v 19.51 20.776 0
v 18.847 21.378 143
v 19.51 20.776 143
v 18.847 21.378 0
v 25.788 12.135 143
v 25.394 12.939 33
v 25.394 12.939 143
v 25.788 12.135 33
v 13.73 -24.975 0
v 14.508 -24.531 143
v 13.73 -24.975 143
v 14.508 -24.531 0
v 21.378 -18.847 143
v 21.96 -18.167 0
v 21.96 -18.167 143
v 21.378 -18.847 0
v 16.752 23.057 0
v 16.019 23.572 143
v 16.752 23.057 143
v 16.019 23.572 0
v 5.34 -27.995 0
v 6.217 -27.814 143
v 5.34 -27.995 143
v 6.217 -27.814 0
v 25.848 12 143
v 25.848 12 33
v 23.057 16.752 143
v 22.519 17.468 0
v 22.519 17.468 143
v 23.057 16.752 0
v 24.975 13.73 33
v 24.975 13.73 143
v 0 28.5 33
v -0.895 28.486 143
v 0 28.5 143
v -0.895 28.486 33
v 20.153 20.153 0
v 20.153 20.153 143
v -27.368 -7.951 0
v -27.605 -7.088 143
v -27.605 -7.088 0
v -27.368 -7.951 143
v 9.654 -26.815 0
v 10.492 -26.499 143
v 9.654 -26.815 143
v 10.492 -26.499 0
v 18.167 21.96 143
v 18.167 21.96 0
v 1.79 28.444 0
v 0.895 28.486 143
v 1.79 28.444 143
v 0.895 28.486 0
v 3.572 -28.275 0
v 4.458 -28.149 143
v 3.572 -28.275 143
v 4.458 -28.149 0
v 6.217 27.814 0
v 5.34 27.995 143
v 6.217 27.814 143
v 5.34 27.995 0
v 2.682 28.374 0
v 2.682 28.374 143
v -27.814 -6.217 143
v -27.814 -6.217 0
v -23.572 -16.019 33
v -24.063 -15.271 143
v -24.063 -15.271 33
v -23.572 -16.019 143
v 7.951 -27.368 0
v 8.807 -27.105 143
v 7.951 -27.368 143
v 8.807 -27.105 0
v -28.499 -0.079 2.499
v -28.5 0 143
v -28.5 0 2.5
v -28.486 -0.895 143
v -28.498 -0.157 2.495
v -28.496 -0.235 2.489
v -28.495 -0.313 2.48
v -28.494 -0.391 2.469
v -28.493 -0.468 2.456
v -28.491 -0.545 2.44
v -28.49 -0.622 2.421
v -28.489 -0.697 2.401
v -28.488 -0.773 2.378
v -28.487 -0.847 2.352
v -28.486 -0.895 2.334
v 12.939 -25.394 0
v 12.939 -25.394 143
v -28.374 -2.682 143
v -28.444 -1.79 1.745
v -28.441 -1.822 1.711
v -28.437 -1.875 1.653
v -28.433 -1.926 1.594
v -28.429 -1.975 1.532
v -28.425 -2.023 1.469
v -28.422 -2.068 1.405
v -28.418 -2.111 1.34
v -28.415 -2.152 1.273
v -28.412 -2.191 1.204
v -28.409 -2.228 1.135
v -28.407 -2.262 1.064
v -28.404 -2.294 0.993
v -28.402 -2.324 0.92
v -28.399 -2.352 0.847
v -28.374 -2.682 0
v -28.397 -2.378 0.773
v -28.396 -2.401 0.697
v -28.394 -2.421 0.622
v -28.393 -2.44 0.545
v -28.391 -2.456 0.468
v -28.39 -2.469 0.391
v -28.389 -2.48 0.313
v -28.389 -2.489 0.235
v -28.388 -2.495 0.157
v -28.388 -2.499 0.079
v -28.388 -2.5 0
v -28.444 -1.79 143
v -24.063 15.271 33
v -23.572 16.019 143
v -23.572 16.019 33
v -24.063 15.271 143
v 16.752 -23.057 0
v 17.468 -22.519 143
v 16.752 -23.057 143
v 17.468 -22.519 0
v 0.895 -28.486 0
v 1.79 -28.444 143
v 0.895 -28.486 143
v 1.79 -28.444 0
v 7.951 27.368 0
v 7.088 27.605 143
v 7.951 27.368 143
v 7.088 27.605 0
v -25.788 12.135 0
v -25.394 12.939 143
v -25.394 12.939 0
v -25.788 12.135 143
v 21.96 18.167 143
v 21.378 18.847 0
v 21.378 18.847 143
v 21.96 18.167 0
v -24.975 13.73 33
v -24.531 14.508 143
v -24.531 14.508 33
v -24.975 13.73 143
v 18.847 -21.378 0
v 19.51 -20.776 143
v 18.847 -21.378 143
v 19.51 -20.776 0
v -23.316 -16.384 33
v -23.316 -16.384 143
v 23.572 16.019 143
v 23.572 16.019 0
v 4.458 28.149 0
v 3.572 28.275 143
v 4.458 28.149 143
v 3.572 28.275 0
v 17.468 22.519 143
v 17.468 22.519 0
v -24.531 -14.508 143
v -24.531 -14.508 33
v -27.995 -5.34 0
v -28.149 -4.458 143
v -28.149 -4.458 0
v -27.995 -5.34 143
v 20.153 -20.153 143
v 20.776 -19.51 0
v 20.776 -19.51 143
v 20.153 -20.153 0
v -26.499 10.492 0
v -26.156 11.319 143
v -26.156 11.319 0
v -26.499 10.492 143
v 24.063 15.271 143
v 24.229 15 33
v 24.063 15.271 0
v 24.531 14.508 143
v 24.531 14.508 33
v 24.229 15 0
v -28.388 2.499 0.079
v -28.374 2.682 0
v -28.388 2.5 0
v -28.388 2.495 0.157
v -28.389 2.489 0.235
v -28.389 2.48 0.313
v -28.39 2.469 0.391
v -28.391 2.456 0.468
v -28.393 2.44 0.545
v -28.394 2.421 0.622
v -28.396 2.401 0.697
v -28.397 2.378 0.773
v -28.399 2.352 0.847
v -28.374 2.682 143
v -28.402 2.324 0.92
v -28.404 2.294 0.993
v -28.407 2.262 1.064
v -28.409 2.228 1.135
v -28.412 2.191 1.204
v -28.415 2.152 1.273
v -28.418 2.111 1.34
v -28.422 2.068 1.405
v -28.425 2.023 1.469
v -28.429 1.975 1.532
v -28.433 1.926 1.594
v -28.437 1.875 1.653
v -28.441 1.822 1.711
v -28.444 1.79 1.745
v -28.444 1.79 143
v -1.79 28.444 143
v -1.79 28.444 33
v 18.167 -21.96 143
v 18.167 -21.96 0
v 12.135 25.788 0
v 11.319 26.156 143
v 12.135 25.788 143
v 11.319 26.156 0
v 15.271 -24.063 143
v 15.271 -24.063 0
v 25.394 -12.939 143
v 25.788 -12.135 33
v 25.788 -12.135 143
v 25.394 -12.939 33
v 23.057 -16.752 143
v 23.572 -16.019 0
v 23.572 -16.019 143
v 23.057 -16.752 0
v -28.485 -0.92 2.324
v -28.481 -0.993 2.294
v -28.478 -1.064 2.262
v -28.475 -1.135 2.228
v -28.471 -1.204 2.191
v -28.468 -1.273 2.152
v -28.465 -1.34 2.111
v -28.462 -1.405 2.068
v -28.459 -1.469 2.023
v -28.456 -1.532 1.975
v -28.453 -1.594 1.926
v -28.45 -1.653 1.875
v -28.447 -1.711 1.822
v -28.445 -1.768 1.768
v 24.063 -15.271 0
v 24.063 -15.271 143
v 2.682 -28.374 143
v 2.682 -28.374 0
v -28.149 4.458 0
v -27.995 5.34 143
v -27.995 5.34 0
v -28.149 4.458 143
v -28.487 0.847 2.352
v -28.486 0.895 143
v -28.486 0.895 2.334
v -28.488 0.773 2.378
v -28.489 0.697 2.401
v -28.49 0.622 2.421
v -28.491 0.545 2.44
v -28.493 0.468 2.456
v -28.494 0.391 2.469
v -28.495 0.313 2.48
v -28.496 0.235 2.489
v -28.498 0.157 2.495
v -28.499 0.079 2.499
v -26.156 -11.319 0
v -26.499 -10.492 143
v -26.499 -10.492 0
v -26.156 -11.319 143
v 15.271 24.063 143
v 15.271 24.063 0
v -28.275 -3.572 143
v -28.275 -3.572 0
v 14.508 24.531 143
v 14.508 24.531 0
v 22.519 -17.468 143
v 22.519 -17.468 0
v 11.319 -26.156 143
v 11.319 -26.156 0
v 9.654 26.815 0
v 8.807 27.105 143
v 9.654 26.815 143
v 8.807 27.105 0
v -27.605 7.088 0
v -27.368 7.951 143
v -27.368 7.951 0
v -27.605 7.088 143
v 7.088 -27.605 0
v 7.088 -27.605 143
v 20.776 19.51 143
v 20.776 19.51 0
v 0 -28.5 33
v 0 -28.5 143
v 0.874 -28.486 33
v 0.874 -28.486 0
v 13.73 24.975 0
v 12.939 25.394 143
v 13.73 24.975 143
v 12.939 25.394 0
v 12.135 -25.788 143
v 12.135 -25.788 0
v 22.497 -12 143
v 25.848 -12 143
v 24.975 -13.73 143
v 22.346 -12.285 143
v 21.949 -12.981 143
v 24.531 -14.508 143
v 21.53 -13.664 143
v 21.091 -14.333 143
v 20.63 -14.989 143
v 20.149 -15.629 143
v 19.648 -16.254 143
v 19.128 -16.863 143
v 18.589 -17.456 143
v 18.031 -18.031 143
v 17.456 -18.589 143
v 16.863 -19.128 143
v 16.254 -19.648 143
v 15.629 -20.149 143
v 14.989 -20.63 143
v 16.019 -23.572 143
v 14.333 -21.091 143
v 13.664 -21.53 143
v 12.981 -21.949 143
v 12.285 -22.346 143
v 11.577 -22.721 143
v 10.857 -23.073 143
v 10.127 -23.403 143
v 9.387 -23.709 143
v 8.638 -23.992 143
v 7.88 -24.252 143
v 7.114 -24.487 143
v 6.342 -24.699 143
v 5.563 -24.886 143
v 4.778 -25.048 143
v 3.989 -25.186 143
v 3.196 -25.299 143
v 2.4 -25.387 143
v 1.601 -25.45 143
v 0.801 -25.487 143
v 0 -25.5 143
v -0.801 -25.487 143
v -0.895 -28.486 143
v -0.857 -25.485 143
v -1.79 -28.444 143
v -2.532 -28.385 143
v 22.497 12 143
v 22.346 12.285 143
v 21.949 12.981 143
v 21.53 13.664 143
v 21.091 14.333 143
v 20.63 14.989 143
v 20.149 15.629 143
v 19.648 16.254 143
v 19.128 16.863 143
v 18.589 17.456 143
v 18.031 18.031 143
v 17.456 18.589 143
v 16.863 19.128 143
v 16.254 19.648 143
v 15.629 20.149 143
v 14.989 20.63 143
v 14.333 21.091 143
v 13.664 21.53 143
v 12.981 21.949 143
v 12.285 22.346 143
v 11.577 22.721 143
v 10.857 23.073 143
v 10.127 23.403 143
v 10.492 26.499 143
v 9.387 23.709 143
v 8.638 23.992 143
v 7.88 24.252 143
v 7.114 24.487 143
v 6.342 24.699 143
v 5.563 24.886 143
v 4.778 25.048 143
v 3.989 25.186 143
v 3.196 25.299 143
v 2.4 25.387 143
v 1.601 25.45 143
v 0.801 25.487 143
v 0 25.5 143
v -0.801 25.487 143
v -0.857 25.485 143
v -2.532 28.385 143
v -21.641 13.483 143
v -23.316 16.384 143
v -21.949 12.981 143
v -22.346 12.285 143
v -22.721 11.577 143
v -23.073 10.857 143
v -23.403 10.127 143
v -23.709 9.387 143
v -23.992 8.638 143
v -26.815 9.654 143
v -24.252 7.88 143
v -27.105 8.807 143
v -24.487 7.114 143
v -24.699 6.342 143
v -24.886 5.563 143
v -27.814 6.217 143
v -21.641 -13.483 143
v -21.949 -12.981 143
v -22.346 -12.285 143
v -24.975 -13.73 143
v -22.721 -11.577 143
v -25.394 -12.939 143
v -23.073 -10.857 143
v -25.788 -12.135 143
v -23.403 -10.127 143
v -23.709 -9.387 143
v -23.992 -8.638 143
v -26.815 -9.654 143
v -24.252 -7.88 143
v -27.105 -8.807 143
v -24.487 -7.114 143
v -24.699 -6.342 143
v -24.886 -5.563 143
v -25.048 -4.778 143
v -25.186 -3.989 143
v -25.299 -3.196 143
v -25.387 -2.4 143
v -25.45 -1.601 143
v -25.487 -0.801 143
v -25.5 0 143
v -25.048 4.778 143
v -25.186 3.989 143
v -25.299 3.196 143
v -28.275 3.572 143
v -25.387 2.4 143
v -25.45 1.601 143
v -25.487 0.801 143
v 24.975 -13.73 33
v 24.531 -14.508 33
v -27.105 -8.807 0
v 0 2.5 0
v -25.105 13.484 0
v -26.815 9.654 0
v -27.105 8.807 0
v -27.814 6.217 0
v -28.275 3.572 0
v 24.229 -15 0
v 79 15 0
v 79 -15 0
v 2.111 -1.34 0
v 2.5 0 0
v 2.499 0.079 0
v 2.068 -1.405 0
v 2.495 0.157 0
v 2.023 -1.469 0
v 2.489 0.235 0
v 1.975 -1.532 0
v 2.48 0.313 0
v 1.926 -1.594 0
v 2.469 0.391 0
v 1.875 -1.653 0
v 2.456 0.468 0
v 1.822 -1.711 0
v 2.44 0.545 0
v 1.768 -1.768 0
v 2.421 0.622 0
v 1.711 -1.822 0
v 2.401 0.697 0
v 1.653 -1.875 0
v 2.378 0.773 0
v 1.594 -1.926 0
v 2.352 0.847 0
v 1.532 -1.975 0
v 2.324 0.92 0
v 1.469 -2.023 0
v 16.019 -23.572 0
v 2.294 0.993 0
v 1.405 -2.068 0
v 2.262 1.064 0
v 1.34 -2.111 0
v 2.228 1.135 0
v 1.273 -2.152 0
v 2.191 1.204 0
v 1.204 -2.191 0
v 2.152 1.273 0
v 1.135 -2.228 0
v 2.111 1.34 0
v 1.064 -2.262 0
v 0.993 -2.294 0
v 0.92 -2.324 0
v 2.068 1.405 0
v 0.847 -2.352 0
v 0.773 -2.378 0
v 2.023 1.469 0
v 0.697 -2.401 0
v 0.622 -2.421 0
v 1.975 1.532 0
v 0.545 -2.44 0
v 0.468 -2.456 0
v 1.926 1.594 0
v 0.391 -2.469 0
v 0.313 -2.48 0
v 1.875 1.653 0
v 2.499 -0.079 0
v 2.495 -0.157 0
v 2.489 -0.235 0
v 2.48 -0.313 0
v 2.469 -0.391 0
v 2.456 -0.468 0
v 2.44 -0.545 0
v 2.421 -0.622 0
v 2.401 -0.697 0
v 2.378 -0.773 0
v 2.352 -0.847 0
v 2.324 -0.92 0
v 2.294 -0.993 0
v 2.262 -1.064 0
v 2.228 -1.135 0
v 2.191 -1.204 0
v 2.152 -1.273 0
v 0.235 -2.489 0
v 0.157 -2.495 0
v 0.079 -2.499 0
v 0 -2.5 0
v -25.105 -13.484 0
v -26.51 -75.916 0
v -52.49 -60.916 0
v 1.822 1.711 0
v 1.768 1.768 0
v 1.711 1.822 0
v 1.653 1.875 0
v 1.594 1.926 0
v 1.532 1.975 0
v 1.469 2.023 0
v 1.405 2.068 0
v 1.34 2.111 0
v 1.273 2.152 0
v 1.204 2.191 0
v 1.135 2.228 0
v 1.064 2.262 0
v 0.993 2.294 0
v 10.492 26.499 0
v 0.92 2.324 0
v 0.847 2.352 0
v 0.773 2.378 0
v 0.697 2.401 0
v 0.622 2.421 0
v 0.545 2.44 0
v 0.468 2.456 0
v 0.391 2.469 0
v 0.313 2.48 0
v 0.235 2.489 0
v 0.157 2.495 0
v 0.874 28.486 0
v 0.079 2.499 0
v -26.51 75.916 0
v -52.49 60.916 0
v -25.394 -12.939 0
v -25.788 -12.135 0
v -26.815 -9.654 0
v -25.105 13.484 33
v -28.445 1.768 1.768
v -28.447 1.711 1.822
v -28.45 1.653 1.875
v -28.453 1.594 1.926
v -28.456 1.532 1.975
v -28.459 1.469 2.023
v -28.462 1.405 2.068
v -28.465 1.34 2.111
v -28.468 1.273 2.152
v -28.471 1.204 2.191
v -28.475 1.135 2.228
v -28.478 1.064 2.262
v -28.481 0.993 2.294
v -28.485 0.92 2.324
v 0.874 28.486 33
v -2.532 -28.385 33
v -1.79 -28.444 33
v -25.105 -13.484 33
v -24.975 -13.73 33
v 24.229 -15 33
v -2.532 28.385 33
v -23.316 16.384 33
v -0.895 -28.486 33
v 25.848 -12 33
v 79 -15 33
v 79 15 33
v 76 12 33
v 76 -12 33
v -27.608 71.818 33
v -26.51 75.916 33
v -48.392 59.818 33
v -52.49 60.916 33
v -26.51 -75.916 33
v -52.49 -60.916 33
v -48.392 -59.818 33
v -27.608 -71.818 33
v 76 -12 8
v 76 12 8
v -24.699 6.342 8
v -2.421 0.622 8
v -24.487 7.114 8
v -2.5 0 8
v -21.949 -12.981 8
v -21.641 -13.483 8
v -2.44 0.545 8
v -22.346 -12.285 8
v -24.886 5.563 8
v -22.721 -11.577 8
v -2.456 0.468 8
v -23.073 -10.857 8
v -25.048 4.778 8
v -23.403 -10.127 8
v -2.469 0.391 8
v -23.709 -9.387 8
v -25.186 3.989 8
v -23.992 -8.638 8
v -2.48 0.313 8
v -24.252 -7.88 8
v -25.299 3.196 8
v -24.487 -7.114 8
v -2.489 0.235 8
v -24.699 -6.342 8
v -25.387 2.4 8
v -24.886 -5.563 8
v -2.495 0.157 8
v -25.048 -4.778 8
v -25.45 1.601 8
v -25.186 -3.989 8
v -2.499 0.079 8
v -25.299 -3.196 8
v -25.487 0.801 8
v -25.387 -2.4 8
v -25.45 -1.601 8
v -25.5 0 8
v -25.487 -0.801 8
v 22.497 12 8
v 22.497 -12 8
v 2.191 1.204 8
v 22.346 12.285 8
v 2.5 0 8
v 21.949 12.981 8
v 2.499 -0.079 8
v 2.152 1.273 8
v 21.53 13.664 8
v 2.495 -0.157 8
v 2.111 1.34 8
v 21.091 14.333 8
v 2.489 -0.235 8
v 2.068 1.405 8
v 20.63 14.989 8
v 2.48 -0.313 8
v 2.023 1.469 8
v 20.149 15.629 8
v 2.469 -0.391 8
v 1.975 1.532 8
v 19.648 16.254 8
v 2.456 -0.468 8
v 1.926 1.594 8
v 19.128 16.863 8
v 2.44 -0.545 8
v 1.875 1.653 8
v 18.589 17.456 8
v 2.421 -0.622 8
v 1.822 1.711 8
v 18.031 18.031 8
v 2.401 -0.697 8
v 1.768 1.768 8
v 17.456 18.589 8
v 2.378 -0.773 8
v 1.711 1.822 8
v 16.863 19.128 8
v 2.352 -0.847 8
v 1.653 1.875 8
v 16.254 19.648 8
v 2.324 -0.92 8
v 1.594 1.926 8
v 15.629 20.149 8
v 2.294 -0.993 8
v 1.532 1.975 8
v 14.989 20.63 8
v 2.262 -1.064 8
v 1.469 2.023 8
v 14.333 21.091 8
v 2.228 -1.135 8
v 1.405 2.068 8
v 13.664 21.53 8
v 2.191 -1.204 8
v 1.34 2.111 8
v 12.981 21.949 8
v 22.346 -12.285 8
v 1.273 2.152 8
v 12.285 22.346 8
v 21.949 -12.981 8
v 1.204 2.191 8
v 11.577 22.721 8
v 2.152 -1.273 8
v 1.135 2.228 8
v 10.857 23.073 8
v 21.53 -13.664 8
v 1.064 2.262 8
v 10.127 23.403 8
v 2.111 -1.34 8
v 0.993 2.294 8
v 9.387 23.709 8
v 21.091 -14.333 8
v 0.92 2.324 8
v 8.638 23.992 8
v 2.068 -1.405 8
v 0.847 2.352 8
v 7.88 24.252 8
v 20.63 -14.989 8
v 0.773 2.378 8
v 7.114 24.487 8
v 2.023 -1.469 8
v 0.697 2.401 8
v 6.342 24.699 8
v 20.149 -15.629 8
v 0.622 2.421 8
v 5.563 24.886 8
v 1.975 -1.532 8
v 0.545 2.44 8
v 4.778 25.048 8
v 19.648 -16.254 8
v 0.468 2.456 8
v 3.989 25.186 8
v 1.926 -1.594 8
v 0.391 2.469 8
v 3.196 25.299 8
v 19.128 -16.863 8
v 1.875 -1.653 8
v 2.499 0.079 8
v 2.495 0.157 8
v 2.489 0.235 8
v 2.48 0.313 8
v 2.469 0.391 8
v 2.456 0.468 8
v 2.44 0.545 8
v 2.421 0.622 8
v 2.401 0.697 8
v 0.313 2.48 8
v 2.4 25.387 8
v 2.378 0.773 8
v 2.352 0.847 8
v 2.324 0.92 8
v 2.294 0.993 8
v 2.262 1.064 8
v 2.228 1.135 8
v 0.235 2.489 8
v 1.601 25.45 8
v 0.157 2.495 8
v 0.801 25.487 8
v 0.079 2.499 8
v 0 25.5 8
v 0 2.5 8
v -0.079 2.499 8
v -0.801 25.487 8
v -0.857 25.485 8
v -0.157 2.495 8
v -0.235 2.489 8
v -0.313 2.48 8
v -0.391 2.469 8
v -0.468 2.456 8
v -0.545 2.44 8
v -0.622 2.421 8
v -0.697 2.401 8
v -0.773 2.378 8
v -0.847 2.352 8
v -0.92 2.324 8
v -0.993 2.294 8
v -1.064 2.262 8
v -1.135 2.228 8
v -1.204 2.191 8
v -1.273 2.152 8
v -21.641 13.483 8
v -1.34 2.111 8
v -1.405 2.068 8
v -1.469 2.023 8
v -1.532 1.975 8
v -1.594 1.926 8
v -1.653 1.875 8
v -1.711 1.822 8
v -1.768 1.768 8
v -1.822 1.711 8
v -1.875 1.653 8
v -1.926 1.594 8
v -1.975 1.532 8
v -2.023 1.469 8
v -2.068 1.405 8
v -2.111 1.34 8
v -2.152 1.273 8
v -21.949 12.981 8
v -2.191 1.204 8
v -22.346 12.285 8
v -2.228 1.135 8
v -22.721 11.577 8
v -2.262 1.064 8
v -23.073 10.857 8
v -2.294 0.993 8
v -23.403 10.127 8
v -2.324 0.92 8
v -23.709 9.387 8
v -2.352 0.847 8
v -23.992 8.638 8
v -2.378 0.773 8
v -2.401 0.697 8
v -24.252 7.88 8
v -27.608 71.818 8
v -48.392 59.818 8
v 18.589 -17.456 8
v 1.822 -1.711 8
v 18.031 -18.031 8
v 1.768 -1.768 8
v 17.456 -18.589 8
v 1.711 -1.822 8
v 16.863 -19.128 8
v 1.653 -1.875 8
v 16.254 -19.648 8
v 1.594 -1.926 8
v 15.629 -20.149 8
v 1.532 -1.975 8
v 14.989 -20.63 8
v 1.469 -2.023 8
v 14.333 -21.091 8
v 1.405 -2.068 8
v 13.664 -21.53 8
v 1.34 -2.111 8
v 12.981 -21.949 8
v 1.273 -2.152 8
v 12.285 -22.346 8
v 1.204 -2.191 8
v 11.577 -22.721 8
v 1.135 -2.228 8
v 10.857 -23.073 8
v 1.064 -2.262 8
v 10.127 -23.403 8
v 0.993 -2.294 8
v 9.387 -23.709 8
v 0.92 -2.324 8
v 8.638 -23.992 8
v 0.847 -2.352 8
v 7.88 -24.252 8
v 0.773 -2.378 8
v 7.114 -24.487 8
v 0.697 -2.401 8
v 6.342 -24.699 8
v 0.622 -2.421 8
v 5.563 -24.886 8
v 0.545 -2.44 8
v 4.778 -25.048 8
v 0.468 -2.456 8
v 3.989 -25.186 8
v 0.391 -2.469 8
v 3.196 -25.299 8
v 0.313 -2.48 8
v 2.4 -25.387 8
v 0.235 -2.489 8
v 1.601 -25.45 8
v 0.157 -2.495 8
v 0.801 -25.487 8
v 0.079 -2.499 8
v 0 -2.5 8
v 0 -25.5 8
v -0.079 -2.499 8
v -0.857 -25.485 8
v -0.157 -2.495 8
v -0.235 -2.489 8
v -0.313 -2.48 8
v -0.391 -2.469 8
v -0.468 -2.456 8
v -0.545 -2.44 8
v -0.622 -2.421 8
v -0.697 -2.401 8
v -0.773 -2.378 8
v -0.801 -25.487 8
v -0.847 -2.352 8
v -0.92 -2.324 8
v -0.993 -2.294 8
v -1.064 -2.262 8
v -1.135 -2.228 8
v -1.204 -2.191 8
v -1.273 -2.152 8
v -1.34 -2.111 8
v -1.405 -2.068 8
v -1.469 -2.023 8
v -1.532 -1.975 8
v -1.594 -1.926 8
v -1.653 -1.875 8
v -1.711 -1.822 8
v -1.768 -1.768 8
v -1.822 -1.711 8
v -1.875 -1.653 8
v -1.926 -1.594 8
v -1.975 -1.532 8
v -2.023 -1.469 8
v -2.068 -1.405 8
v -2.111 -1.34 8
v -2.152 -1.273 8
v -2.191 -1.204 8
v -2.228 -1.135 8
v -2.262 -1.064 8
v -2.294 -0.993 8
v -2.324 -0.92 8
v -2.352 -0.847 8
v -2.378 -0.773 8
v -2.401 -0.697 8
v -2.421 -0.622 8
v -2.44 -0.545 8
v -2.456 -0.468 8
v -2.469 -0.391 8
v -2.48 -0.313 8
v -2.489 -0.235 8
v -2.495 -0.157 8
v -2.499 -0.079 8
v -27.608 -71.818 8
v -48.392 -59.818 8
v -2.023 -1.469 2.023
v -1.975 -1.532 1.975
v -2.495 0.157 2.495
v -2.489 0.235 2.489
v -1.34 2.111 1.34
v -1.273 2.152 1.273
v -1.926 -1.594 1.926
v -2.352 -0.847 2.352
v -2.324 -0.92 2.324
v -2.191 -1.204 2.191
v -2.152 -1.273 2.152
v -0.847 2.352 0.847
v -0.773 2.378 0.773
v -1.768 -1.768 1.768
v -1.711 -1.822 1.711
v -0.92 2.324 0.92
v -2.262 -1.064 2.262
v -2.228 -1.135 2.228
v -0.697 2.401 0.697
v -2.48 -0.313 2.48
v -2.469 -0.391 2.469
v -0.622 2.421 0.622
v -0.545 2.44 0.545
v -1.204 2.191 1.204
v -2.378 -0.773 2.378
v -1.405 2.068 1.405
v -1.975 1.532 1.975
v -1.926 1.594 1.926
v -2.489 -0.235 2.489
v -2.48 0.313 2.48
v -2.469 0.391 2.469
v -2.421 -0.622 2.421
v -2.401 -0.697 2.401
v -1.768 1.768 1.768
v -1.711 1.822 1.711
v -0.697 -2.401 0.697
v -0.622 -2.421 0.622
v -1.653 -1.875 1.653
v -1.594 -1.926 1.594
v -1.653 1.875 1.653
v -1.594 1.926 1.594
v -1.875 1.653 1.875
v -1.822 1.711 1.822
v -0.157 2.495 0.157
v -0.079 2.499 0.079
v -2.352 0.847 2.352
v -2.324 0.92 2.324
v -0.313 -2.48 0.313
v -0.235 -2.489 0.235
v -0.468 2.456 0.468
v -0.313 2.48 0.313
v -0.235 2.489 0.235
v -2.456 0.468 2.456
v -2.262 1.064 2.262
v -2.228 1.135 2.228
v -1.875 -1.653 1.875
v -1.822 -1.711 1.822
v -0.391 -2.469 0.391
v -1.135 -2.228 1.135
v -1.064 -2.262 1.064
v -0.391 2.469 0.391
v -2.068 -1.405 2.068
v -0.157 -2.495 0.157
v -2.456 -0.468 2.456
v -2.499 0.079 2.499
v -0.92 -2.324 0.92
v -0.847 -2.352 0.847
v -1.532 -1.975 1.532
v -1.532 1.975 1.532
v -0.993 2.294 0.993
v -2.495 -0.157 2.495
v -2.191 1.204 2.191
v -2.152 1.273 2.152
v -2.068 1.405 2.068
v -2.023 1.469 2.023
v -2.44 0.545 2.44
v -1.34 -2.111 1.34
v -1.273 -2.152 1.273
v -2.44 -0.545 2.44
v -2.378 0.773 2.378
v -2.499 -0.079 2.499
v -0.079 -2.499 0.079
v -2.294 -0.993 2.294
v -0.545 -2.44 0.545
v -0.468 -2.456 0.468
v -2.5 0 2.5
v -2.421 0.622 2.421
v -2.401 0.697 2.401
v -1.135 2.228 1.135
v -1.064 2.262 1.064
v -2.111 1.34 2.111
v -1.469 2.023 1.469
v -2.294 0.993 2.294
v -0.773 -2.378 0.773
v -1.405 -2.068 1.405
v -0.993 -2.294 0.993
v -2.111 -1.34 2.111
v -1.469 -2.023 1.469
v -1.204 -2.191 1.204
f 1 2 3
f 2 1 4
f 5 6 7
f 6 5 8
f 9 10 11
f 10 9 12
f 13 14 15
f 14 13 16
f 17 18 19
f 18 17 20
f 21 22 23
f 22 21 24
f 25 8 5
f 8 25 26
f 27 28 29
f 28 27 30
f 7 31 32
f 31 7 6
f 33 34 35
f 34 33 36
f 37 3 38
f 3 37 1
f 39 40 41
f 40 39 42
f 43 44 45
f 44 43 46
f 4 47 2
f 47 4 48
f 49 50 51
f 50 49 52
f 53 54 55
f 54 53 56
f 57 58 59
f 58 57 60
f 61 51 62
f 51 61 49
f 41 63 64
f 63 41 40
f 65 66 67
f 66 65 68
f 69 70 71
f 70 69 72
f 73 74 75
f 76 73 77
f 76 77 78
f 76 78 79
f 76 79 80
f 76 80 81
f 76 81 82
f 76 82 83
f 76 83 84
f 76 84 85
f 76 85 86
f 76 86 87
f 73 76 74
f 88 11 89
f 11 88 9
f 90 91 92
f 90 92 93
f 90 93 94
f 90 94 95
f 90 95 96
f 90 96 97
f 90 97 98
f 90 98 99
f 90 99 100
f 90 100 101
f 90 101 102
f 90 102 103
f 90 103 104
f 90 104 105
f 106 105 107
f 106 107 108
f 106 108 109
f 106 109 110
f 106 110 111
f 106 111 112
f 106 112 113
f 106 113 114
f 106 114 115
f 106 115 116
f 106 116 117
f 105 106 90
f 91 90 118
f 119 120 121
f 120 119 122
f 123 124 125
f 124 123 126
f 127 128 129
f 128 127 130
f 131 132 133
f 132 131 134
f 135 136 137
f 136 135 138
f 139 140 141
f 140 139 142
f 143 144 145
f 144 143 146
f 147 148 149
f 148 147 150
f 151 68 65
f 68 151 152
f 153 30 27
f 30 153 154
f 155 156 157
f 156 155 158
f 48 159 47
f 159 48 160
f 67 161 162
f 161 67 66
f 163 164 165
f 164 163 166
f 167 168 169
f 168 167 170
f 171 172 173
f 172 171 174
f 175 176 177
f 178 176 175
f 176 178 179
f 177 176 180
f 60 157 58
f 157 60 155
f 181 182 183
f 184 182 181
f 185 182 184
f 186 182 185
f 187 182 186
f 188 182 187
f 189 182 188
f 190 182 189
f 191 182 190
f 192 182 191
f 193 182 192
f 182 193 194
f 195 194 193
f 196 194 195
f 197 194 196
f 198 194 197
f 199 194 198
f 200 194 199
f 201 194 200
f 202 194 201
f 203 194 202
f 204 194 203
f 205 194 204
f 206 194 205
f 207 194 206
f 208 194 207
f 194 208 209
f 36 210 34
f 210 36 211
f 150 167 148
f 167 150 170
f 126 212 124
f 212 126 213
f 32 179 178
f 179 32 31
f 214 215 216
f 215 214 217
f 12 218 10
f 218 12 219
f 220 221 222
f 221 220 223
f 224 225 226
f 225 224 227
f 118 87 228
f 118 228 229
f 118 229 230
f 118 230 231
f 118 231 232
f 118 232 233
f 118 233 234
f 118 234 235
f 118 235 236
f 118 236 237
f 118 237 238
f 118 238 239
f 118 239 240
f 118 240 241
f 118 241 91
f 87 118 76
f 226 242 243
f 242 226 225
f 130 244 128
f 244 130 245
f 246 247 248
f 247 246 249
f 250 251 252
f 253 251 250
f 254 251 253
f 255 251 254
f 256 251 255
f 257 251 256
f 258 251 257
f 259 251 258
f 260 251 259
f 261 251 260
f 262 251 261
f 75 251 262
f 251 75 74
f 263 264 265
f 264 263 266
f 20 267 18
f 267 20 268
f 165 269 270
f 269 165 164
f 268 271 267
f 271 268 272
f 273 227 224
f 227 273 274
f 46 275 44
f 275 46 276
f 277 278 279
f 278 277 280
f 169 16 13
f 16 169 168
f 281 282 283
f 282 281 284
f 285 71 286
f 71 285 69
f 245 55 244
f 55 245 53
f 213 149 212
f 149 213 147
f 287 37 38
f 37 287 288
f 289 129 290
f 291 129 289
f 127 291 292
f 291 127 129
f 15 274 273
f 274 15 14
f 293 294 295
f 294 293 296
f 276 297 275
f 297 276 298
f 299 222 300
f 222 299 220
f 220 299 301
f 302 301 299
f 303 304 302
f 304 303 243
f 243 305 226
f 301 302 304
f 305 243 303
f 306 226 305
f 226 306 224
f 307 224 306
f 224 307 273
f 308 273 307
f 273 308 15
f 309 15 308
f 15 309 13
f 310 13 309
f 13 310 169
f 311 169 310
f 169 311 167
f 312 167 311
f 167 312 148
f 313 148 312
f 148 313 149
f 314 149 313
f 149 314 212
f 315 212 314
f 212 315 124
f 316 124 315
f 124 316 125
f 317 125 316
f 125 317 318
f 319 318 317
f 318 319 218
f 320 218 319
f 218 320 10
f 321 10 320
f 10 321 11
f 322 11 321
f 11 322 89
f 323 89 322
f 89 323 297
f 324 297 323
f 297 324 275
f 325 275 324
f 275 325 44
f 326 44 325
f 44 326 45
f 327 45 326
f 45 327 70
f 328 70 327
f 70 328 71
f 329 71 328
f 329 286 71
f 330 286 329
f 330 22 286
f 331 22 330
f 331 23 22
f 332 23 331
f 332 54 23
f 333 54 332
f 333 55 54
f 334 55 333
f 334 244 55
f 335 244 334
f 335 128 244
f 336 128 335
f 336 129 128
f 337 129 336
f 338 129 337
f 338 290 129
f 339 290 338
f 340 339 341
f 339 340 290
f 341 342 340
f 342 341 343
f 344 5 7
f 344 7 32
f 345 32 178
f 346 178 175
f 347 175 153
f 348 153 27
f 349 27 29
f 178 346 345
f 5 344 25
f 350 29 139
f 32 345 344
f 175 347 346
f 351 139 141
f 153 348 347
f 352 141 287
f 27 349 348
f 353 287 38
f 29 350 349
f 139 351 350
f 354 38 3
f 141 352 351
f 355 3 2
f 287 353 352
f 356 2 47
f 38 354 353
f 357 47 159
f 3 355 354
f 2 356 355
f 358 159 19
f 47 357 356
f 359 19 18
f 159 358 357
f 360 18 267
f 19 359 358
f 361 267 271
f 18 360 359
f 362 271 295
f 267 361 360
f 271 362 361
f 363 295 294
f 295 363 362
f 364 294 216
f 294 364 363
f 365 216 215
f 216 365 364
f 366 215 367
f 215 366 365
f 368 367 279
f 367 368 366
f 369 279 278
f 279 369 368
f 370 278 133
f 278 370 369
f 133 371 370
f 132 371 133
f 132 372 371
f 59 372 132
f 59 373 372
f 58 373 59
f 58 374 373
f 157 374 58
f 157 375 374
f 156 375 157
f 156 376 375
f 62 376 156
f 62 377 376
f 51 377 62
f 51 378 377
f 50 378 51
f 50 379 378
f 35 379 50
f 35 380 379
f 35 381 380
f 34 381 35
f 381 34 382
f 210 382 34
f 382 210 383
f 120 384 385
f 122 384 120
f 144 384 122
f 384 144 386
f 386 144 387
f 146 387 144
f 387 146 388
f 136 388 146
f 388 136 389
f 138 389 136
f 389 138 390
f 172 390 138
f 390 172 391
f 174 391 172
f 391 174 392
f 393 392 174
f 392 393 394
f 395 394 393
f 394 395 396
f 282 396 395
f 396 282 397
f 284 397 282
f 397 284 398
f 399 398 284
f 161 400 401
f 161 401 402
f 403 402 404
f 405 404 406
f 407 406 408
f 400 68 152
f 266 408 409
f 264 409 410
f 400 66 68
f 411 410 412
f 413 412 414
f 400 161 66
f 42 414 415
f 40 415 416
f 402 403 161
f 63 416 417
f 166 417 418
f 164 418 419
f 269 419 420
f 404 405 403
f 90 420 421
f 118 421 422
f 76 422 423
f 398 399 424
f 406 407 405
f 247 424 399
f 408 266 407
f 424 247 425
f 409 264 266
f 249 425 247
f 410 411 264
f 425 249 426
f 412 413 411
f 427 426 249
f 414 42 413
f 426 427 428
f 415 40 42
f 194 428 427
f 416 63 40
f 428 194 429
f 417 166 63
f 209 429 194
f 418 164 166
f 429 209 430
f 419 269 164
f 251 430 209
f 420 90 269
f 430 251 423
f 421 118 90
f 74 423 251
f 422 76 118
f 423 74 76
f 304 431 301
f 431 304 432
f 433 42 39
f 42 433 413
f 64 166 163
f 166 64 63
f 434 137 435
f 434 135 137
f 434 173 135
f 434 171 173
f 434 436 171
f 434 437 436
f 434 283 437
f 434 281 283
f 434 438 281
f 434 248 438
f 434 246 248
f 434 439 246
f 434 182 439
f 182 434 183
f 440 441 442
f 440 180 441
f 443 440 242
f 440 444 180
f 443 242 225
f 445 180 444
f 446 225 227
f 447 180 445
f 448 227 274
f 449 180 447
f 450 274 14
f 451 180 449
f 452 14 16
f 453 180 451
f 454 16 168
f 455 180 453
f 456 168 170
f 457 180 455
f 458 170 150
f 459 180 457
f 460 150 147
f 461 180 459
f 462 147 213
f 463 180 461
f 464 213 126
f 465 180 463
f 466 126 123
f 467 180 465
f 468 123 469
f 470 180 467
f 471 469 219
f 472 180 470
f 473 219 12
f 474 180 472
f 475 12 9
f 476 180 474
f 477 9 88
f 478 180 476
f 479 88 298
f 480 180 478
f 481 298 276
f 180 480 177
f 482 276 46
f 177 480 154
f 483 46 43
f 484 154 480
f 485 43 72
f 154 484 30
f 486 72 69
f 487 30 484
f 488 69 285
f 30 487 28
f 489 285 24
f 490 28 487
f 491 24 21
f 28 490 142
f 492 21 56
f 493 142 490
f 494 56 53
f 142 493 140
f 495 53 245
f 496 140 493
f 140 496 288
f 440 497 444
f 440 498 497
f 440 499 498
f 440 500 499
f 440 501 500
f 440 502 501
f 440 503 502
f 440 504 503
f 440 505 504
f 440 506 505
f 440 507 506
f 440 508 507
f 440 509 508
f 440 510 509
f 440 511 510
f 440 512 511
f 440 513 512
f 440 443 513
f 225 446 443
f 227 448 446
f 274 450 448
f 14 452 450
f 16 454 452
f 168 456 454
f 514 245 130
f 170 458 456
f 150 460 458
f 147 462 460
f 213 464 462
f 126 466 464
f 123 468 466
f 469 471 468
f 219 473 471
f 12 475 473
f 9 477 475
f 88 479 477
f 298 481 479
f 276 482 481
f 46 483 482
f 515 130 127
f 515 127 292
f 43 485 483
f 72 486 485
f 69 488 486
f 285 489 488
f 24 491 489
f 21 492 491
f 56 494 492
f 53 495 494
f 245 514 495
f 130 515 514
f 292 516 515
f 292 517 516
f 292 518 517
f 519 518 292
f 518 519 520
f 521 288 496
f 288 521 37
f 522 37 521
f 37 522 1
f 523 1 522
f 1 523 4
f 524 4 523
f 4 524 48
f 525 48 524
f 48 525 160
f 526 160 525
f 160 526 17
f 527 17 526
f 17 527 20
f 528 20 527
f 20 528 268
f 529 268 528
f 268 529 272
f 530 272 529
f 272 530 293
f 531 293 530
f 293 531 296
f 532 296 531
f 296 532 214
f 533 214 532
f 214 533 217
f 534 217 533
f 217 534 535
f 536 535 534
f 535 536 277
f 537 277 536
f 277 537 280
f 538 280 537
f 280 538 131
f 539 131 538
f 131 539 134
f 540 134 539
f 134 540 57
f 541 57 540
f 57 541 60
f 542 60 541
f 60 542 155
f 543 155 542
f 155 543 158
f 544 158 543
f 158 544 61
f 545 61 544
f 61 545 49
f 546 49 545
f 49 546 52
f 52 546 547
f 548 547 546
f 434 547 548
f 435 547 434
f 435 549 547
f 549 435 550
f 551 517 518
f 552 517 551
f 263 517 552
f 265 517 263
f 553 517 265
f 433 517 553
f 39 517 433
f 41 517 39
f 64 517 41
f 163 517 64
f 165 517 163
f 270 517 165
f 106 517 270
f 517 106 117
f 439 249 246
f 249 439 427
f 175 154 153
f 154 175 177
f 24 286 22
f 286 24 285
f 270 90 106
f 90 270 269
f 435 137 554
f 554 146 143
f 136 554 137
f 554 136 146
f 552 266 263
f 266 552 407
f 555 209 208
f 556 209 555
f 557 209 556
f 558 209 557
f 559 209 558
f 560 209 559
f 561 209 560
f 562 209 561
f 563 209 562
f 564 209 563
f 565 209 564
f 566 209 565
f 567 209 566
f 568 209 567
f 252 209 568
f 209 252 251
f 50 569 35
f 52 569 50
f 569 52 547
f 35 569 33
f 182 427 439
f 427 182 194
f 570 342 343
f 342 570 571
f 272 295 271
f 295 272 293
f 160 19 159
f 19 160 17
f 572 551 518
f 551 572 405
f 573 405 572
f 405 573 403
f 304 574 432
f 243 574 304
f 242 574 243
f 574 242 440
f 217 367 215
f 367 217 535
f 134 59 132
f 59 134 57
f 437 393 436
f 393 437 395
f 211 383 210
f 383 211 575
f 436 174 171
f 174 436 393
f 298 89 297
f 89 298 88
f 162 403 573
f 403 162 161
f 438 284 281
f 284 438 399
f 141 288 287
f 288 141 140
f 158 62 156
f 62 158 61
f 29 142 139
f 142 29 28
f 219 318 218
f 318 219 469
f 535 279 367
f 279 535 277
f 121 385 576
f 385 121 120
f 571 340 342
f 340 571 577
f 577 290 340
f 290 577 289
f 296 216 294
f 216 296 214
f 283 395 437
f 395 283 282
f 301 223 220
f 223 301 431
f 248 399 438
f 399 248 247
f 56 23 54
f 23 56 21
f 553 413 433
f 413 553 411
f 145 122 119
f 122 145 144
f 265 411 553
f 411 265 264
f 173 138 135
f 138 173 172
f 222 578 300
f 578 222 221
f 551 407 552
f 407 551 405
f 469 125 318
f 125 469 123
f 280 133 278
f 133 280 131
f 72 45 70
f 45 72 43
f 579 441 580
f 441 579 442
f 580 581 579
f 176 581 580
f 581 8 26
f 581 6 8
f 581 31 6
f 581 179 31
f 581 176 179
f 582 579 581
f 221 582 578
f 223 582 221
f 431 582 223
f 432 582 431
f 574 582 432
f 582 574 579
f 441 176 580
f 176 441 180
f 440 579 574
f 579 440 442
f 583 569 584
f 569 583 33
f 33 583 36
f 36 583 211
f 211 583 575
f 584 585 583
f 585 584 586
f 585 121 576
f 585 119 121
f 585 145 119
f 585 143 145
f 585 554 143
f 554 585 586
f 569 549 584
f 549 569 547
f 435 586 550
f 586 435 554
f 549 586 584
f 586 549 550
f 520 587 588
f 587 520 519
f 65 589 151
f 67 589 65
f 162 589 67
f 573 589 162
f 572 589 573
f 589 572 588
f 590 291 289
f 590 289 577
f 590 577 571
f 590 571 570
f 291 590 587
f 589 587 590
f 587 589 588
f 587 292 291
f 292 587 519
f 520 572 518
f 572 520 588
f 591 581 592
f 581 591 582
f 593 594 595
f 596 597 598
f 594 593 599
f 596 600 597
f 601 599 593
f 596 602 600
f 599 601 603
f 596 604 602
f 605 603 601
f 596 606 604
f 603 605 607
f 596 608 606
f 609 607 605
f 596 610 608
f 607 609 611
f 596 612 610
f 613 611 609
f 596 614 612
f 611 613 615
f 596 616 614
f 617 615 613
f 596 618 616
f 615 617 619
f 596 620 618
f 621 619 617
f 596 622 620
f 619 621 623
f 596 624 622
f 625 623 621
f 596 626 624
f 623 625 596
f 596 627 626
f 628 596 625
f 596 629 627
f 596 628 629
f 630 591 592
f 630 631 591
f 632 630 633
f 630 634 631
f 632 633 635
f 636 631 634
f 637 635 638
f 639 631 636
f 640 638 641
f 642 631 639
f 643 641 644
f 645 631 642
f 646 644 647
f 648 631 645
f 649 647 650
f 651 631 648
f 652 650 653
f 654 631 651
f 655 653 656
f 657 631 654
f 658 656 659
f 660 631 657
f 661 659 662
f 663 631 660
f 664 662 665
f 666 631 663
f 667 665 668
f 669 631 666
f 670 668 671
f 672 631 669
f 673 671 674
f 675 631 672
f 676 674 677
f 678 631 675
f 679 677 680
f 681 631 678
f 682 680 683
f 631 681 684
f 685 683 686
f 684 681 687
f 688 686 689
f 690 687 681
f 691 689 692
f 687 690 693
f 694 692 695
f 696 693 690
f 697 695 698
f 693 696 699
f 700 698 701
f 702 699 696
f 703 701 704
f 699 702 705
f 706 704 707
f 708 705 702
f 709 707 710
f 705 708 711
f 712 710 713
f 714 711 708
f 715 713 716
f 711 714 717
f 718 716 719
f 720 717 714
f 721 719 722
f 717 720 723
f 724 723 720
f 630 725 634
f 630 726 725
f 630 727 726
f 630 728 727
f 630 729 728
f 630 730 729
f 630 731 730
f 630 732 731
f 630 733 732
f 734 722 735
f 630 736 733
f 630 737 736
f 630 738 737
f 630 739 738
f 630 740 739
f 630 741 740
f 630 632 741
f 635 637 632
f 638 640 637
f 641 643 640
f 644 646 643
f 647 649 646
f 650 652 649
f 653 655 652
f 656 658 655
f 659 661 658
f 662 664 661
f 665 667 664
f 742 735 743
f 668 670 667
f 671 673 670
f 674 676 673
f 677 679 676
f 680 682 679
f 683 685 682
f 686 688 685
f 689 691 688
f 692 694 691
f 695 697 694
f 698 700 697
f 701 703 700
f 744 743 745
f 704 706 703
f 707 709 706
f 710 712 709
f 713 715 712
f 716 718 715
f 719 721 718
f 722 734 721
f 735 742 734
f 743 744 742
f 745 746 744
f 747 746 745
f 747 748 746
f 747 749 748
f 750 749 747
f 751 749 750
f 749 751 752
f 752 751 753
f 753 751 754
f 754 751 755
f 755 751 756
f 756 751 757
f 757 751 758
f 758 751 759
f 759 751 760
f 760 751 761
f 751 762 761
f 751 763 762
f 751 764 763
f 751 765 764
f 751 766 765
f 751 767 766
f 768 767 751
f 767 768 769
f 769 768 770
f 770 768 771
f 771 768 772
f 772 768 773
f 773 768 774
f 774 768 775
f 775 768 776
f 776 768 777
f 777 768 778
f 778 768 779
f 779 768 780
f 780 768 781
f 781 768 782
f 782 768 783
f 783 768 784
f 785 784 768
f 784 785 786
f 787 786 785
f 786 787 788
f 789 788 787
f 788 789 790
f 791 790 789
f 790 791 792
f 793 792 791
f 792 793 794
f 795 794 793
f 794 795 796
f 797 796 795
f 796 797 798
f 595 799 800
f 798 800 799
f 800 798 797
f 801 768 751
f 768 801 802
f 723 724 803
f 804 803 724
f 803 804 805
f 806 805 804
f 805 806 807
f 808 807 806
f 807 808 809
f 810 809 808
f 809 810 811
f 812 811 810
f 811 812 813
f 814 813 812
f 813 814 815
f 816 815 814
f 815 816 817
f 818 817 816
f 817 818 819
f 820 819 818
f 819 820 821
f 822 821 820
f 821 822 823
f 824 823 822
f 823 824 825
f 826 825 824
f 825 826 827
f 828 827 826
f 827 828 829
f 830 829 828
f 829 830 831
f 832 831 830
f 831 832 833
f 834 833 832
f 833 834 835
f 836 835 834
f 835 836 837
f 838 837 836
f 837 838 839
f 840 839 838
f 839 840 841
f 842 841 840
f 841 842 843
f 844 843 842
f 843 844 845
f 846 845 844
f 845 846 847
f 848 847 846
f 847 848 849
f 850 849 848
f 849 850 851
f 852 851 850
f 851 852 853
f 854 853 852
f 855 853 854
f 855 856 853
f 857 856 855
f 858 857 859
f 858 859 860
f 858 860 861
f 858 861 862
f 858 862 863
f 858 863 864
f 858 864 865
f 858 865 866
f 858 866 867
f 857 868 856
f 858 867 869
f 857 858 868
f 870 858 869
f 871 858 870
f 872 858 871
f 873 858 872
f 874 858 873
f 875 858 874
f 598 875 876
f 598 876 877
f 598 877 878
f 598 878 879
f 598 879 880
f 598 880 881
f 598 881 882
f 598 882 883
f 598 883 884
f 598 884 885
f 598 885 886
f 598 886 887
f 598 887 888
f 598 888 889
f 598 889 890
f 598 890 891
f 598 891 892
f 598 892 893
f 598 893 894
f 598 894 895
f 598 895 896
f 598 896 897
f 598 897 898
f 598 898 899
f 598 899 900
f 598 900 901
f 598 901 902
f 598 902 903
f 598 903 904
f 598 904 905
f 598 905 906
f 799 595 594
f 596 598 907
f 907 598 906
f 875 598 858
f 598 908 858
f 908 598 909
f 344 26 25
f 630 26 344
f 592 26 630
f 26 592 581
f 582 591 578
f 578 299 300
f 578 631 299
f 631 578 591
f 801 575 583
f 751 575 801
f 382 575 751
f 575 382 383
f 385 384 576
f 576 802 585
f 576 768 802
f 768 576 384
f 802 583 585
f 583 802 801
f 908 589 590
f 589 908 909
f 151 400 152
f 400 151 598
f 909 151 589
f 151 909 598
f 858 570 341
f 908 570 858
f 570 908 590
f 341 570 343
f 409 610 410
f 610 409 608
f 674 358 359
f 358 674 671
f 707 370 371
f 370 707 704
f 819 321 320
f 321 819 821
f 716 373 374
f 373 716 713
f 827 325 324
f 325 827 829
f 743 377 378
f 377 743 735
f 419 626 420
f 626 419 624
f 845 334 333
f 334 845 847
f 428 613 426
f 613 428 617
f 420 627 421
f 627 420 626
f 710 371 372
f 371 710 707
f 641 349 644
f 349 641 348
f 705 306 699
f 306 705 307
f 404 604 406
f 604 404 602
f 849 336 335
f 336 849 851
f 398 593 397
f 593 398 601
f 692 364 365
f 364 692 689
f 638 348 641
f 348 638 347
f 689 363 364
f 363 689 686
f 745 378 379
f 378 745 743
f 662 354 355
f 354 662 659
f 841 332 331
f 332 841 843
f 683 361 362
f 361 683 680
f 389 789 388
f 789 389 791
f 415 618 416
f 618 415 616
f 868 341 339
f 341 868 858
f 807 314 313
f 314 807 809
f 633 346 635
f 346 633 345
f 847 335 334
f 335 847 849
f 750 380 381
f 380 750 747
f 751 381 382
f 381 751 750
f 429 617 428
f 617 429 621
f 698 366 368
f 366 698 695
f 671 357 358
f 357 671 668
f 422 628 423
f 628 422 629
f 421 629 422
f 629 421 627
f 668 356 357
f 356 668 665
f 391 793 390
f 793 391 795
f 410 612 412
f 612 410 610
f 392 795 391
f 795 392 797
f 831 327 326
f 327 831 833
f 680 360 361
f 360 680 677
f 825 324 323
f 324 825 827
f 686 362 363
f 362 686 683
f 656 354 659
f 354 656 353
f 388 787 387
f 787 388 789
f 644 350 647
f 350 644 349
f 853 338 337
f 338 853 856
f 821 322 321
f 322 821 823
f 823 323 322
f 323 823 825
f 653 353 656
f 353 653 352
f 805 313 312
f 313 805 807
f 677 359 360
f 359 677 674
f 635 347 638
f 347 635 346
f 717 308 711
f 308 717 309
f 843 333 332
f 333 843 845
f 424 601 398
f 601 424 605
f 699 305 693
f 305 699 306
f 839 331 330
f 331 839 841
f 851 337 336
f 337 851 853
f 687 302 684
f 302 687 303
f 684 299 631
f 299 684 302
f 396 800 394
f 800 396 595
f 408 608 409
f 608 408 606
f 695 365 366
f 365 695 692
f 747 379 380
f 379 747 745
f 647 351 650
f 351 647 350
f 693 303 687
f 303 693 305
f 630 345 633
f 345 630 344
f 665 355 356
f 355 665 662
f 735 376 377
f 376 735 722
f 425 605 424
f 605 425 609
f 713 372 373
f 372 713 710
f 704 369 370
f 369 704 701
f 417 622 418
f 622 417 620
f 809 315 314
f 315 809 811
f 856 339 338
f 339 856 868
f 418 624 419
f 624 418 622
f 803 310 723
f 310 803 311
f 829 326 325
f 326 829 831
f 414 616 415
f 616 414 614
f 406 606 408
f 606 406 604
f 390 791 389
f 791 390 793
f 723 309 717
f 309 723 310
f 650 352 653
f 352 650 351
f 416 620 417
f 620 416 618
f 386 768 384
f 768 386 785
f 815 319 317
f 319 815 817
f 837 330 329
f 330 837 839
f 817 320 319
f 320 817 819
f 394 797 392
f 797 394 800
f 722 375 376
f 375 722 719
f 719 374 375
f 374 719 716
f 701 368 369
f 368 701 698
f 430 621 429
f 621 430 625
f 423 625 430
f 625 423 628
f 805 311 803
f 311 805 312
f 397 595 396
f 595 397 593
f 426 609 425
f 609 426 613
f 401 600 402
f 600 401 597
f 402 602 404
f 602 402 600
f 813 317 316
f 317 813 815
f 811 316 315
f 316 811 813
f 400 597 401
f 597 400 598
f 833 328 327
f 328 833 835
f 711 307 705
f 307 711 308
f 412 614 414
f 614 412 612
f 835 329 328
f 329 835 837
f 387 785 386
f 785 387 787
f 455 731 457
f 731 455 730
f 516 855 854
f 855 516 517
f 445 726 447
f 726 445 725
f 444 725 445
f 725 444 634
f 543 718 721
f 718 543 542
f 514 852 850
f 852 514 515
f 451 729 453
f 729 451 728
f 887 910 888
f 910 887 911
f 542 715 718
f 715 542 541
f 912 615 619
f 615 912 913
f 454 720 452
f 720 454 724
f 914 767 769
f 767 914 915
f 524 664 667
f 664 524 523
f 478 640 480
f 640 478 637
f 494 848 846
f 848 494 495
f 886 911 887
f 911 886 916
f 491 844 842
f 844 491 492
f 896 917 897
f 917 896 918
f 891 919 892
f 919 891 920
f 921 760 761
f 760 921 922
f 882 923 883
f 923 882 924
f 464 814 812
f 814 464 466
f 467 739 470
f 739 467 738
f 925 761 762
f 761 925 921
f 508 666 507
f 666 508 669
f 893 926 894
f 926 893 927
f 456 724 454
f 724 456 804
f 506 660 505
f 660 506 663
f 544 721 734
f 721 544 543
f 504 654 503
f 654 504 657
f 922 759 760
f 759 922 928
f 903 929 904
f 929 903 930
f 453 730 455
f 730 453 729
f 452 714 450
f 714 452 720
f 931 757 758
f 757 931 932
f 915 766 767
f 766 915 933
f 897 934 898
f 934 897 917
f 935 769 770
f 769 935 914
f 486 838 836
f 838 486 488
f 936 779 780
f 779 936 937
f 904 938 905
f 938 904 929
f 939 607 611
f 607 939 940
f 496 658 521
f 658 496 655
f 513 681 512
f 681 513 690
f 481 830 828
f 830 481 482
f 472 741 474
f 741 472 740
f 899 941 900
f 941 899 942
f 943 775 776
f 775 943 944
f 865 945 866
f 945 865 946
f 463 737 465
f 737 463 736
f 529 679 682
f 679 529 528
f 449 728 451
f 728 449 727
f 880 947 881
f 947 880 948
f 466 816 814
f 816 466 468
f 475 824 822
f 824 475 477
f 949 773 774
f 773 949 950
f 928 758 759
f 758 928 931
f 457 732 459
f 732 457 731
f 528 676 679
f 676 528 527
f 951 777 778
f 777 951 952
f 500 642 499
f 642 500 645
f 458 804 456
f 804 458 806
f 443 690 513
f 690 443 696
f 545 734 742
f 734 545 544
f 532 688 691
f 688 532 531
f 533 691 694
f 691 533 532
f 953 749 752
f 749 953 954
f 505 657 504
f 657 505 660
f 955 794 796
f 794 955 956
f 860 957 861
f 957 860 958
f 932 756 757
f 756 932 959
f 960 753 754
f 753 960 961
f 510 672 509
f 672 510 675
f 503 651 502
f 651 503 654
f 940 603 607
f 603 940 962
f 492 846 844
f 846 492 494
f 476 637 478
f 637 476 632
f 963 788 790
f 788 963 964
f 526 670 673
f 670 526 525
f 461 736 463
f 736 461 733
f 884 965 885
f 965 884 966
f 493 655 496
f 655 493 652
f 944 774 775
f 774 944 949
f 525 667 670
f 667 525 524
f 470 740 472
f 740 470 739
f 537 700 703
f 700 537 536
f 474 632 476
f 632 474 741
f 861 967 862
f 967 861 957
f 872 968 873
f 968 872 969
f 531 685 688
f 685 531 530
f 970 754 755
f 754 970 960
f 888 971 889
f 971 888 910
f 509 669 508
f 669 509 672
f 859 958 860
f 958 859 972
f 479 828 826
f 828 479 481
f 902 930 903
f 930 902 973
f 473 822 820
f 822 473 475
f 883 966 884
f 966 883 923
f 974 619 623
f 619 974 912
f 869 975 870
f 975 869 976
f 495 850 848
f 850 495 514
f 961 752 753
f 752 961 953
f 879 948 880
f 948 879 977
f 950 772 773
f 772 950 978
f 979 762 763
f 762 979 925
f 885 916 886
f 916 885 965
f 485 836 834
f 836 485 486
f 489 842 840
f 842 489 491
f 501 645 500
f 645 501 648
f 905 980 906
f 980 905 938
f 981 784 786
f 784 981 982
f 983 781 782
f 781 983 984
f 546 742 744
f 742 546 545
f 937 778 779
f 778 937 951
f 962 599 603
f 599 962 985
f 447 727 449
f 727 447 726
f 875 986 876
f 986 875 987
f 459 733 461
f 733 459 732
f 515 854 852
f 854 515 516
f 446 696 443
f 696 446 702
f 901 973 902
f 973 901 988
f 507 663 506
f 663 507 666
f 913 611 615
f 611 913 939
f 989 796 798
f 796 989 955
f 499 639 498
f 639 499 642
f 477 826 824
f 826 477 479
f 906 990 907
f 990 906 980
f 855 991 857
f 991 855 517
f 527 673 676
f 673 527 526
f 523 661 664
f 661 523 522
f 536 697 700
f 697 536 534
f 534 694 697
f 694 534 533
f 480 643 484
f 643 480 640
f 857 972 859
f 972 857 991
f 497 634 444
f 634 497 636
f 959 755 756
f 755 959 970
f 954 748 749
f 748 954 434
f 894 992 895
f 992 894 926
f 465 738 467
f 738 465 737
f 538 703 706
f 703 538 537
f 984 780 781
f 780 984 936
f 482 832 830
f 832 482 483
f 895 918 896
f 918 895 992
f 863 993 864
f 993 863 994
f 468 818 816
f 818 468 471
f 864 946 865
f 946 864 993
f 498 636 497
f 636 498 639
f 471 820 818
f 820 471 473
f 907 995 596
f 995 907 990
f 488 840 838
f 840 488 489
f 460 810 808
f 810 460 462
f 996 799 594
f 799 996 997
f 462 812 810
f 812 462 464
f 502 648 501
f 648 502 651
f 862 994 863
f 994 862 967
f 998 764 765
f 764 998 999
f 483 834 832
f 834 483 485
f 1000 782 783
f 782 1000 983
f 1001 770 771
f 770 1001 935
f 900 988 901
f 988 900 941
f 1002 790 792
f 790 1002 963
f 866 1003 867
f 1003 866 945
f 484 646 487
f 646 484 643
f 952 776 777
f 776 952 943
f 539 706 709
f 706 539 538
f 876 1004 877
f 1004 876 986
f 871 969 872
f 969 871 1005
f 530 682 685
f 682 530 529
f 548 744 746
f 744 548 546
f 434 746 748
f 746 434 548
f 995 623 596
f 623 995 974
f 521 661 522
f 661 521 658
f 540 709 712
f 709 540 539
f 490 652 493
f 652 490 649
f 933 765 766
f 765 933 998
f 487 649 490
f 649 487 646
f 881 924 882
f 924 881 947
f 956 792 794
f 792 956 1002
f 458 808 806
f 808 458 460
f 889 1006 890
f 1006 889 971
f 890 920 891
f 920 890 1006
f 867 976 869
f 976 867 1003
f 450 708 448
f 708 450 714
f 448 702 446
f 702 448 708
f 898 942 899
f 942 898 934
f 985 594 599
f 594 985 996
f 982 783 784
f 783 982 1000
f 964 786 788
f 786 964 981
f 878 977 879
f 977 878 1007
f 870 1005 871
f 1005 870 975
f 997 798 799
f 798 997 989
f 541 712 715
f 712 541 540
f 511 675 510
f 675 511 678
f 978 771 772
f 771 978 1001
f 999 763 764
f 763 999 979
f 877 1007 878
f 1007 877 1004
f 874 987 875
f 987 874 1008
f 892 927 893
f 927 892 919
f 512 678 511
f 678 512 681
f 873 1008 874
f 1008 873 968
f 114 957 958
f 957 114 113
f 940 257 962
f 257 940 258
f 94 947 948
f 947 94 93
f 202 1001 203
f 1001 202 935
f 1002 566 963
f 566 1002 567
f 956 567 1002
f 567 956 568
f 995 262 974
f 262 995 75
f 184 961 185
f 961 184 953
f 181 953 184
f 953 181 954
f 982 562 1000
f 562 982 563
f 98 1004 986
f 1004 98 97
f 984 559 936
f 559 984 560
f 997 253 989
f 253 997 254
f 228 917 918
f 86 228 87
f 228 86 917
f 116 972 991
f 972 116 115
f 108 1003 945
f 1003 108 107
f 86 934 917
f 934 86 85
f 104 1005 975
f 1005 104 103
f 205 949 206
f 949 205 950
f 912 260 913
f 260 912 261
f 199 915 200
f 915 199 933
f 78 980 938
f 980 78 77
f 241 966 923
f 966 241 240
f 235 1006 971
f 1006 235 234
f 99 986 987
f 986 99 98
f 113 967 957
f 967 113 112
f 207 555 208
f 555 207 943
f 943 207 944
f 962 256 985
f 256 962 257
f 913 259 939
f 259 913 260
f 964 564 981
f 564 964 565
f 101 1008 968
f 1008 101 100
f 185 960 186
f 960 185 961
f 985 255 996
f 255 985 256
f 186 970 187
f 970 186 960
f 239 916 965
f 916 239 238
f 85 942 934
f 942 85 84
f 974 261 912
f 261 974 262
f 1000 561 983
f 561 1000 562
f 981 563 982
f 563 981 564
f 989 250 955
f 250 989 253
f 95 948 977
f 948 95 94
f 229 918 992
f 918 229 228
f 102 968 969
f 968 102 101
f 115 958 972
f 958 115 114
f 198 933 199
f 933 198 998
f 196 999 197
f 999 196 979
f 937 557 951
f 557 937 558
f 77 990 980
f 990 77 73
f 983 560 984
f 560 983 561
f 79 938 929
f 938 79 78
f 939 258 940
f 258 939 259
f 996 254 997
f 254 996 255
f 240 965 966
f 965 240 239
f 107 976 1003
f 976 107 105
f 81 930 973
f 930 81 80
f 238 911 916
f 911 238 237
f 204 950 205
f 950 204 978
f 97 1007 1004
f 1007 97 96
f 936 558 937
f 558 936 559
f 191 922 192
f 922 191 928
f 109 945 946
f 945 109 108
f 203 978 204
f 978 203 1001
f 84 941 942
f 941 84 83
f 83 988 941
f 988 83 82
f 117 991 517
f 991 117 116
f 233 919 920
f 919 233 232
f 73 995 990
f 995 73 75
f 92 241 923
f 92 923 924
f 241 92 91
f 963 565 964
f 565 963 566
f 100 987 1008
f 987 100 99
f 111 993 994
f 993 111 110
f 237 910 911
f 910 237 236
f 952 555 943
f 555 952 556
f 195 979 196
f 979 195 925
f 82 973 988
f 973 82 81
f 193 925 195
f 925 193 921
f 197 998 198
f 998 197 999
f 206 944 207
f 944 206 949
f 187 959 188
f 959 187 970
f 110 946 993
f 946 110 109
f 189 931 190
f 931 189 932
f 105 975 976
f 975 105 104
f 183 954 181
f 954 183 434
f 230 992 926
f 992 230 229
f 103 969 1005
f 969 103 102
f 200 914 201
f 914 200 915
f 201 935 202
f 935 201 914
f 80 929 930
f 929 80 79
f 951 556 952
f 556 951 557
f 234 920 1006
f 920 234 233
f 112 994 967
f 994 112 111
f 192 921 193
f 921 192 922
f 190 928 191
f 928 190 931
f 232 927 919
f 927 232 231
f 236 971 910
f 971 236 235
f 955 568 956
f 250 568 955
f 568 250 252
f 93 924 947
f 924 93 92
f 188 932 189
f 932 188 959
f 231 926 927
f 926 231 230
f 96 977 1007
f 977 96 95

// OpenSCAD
//Main cone and mold
h = 180; //Cone height
maxDiam = 45; //Cone
minDiam = 35; //Cone
centerSolidDiam=15;
moldWallThickness = 3;
footDiam=100; //Foot for mold
siliconeThickness=3; //Outer
dividersThickness = 5;
////Assembly on the sides of mold////
numberOfHoles = 4;
screwSize=5;
assemblyWidth= 22;

//Bottom
straightHeightBottom = 20;
bottomThickness=3.5;
LDRHolderThickness= 10;
LDRHolderDiam= minDiam+3;
delta=0.4; //Inaccuracy of printer (layering and overextrusion)
LDRHoleDepth=8;//NOT MEASURED
LDRHolderThickness = 8 +2.5;
LDRDiam=6; //NOT MEASURED
LDRWireHolesDist=3;//NOT MEASURED distance between wires on LDR
LDRHoleDist=LDRHolderDiam/2-LDRDiam;
LDRNumber=3;

//Top part
straightHeight= 30; 
wiresDiameter=5; 

//Joints
jointThickness = 3;

//Assembly
numberOfHoles = 4;
screwSize=5;


//Finishing mold:
finMoldHeight=25;
finMoldWidth=30;
supportMoldLength=60;
supportMoldWidth=30;
FinalBottomThickness =8;

$fn=200;

union() {


//Main cone
difference(){

union() {
cylinder(h*(3/4)+FinalBottomThickness,d2=maxDiam+moldWallThickness*4,d1=maxDiam+moldWallThickness*4); //Solid cylinder
translate([(maxDiam+moldWallThickness*4)/3,-supportMoldWidth/2,0]) cube([supportMoldLength,supportMoldWidth,finMoldHeight+FinalBottomThickness]);//Solid cube 1
rotate (120) translate([(maxDiam+moldWallThickness*4)/3,-supportMoldWidth/2,0]) cube([supportMoldLength,supportMoldWidth,finMoldHeight+FinalBottomThickness]);//Solid cube 2
rotate (240) translate([(maxDiam+moldWallThickness*4)/3,-supportMoldWidth/2,0]) cube([supportMoldLength,supportMoldWidth,finMoldHeight+FinalBottomThickness]);//Solid cube 3

    }
    
translate([0,0,FinalBottomThickness]) {
    translate([(maxDiam+moldWallThickness*4)/3+moldWallThickness,-supportMoldWidth/2+moldWallThickness,0]) cube([supportMoldLength-moldWallThickness*2,supportMoldWidth-moldWallThickness*2,h+FinalBottomThickness]); //Erase cube 1
    
rotate (120) translate([(maxDiam+moldWallThickness*4)/3+moldWallThickness,-supportMoldWidth/2+moldWallThickness,0]) cube([supportMoldLength-moldWallThickness*2,supportMoldWidth-moldWallThickness*2,h+FinalBottomThickness]); //Erase cube 2

rotate (240) translate([(maxDiam+moldWallThickness*4)/3+moldWallThickness,-supportMoldWidth/2+moldWallThickness,0]) cube([supportMoldLength-moldWallThickness*2,supportMoldWidth-moldWallThickness*2,h+FinalBottomThickness]); //Erase cube 3


cylinder(h+FinalBottomThickness,d2=maxDiam+moldWallThickness*2,d1=maxDiam+moldWallThickness*2); //Erase cylinder


}
cylinder(FinalBottomThickness,d1=wiresDiameter,d2=wiresDiameter); //Make hole for wires

rotate(270, [0,1,0]) cylinder(finMoldWidth,d1=wiresDiameter,d2=wiresDiameter); //Make SLIT for wires

}



}
